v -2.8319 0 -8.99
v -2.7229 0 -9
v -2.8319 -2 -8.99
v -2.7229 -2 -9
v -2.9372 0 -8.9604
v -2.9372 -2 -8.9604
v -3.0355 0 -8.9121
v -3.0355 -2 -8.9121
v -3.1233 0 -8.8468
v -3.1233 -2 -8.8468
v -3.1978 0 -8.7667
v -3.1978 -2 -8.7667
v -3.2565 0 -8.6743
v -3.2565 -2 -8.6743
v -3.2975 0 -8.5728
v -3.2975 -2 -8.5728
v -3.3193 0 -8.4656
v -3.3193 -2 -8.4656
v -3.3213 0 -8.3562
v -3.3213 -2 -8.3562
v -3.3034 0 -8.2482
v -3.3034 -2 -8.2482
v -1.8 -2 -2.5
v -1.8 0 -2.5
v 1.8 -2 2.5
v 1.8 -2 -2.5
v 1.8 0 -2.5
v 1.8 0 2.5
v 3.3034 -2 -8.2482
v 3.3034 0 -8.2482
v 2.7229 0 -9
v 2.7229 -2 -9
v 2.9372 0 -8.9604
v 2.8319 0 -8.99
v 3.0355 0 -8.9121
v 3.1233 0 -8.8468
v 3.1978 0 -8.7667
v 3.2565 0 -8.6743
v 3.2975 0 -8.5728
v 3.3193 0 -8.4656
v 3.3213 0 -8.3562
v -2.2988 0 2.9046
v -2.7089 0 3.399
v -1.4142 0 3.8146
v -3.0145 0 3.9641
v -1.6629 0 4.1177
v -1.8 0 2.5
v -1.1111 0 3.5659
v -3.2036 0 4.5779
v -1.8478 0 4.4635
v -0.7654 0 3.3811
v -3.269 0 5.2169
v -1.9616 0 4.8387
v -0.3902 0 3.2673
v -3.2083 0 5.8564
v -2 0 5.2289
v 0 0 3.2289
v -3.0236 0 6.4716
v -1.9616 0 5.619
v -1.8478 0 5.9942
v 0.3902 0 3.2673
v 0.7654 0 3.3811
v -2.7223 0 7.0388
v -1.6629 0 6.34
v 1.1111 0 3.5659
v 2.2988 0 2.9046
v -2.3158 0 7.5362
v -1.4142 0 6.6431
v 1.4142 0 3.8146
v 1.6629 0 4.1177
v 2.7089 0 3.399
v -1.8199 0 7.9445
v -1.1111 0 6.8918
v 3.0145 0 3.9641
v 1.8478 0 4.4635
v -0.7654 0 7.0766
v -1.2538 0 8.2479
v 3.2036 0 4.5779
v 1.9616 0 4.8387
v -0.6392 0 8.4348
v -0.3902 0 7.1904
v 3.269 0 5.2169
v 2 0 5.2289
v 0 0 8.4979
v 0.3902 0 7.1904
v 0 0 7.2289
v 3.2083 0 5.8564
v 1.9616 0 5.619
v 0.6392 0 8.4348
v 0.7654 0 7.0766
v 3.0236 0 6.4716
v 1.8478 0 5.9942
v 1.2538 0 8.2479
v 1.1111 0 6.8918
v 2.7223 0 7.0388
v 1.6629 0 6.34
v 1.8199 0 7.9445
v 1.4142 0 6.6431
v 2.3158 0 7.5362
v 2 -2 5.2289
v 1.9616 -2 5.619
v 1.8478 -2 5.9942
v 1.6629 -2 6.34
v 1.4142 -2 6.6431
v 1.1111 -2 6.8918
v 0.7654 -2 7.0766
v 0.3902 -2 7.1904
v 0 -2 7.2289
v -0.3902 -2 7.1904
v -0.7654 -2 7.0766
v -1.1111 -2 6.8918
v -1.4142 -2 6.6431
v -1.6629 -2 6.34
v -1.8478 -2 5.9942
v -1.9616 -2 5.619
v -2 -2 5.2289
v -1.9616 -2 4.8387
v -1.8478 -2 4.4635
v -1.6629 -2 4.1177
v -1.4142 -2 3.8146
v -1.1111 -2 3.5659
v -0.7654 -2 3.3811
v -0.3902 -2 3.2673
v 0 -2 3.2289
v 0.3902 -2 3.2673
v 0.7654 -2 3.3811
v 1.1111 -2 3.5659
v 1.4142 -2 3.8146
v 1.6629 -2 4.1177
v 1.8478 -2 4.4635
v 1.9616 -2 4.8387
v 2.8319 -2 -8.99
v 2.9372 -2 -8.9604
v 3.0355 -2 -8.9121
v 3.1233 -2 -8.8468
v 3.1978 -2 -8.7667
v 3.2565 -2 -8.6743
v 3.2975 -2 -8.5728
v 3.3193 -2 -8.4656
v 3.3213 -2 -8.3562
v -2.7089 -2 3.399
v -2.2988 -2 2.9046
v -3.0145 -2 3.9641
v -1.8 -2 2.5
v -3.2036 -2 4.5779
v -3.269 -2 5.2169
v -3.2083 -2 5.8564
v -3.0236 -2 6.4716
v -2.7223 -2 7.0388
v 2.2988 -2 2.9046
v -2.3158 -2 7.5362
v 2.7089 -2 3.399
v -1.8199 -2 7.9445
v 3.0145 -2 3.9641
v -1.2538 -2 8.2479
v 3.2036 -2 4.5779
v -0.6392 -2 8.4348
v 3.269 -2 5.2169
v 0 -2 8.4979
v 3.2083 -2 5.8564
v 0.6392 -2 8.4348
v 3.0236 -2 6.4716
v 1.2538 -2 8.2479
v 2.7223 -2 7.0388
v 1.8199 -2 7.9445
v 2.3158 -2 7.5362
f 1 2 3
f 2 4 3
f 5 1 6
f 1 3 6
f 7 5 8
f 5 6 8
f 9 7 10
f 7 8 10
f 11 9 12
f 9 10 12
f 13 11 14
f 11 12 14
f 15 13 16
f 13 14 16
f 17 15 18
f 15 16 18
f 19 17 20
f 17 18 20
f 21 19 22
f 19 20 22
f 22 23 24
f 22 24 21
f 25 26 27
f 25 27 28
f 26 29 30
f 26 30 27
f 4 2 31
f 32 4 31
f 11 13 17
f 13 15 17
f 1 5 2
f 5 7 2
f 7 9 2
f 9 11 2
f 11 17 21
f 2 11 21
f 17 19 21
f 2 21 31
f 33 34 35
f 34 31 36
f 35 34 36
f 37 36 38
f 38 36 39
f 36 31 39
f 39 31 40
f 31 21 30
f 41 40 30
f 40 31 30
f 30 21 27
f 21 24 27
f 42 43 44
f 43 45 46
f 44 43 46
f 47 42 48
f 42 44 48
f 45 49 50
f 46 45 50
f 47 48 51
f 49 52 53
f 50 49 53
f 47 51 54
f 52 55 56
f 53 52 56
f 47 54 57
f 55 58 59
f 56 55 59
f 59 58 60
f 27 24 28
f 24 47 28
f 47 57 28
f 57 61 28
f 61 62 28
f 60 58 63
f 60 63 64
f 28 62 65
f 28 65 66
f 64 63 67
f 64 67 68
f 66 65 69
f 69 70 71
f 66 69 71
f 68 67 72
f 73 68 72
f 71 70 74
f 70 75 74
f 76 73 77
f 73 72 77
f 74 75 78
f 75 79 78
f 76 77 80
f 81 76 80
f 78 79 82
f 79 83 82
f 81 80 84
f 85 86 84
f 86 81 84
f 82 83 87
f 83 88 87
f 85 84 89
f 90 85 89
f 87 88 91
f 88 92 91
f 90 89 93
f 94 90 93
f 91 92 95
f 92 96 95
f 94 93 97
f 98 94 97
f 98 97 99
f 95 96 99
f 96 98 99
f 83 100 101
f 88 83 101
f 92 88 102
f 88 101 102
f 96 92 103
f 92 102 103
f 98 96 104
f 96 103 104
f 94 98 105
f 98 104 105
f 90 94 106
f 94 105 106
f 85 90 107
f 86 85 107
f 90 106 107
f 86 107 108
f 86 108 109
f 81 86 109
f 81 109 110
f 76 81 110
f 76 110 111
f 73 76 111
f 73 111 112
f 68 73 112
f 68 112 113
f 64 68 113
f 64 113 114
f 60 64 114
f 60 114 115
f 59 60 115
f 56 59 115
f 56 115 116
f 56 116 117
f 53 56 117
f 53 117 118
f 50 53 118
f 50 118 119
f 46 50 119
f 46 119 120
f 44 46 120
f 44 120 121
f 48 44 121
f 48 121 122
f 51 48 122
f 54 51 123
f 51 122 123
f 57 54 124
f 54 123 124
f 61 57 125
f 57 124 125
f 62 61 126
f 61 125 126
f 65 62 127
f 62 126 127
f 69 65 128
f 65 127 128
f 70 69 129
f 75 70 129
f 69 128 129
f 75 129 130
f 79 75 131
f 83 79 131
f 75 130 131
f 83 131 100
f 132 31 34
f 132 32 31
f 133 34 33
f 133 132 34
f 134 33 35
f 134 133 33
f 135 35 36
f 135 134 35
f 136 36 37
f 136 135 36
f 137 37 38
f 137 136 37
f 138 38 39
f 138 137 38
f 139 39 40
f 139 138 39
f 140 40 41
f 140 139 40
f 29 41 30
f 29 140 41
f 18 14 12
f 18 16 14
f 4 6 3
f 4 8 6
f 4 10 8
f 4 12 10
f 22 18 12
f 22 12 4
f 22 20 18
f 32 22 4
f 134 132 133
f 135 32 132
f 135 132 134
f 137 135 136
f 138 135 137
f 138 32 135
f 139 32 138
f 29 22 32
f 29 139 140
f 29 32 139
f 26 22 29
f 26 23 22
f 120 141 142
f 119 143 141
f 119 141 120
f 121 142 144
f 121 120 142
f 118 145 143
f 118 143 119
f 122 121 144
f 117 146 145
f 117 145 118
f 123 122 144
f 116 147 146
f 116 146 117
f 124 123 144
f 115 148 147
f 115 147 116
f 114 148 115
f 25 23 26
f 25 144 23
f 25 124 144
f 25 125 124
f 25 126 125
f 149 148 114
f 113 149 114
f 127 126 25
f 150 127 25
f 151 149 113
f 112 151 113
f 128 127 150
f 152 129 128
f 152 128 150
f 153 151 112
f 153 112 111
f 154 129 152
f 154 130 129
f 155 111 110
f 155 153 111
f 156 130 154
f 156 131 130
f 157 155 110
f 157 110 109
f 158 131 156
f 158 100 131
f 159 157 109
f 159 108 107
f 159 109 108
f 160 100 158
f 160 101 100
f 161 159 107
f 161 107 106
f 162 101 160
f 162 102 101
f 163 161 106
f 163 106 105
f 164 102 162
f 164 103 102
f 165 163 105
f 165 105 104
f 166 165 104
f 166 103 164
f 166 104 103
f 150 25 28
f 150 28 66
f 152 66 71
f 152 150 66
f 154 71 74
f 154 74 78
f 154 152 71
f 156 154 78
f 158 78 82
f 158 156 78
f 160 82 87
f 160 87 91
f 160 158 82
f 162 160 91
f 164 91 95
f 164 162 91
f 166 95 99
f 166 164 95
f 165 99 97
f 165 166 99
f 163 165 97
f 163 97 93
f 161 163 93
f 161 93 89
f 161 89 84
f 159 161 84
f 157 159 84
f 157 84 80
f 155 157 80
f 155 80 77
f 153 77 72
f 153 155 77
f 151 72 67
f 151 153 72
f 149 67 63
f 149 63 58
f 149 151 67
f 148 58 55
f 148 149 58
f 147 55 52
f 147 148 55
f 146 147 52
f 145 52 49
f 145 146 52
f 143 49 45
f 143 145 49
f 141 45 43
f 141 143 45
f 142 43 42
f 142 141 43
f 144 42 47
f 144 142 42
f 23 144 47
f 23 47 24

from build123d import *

# Parameters (mm, degrees)
F0_W     = 7
F0_H     = 18
F2_DEPTH = 2
F3_DEPTH = 12.5
F4_R     = 0.6
F5_R     = 0.6
F6_R     = 2
F7_DEPTH = 25


with BuildPart() as f2:
    # F0 (on Front) → F2 (new body)
    with BuildSketch(Plane.XZ):
        Rectangle(F0_W, F0_H)
    extrude(amount=F2_DEPTH)

    # F1 (on face) → F3 (intersect, symmetric)
    with BuildSketch(Plane.XZ):
        with BuildLine():
            Line((-3.5, -9), (3.5, -9))
            Line((3.5, -9), (1.8, -2.5))
            Line((1.8, -2.5), (1.8, 2.5))
            ThreePointArc((1.8, 2.5), (0, 8.4978990818), (-1.8, 2.5))
            Line((-1.8, 2.5), (-1.8, -2.5))
            Line((-1.8, -2.5), (-3.5, -9))
        make_face()
    extrude(amount=F3_DEPTH, both=True, mode=Mode.INTERSECT)

    # F4
    f4_edges = [f2.edges().sort_by_distance(p)[0] for p in [
        (3.5, -1, -9),
    ]]
    fillet(f4_edges, radius=F4_R)

    # F5
    f5_edges = [f2.edges().sort_by_distance(p)[0] for p in [
        (-3.5, -1, -9),
    ]]
    fillet(f5_edges, radius=F5_R)

    # F6 (on face) → F7 (cut)
    with BuildSketch(Plane.XZ.offset(2)):
        with Locations((0, 5.2288549665)):
            Circle(F6_R)
    extrude(amount=-F7_DEPTH, mode=Mode.SUBTRACT)


solid = f2.part
